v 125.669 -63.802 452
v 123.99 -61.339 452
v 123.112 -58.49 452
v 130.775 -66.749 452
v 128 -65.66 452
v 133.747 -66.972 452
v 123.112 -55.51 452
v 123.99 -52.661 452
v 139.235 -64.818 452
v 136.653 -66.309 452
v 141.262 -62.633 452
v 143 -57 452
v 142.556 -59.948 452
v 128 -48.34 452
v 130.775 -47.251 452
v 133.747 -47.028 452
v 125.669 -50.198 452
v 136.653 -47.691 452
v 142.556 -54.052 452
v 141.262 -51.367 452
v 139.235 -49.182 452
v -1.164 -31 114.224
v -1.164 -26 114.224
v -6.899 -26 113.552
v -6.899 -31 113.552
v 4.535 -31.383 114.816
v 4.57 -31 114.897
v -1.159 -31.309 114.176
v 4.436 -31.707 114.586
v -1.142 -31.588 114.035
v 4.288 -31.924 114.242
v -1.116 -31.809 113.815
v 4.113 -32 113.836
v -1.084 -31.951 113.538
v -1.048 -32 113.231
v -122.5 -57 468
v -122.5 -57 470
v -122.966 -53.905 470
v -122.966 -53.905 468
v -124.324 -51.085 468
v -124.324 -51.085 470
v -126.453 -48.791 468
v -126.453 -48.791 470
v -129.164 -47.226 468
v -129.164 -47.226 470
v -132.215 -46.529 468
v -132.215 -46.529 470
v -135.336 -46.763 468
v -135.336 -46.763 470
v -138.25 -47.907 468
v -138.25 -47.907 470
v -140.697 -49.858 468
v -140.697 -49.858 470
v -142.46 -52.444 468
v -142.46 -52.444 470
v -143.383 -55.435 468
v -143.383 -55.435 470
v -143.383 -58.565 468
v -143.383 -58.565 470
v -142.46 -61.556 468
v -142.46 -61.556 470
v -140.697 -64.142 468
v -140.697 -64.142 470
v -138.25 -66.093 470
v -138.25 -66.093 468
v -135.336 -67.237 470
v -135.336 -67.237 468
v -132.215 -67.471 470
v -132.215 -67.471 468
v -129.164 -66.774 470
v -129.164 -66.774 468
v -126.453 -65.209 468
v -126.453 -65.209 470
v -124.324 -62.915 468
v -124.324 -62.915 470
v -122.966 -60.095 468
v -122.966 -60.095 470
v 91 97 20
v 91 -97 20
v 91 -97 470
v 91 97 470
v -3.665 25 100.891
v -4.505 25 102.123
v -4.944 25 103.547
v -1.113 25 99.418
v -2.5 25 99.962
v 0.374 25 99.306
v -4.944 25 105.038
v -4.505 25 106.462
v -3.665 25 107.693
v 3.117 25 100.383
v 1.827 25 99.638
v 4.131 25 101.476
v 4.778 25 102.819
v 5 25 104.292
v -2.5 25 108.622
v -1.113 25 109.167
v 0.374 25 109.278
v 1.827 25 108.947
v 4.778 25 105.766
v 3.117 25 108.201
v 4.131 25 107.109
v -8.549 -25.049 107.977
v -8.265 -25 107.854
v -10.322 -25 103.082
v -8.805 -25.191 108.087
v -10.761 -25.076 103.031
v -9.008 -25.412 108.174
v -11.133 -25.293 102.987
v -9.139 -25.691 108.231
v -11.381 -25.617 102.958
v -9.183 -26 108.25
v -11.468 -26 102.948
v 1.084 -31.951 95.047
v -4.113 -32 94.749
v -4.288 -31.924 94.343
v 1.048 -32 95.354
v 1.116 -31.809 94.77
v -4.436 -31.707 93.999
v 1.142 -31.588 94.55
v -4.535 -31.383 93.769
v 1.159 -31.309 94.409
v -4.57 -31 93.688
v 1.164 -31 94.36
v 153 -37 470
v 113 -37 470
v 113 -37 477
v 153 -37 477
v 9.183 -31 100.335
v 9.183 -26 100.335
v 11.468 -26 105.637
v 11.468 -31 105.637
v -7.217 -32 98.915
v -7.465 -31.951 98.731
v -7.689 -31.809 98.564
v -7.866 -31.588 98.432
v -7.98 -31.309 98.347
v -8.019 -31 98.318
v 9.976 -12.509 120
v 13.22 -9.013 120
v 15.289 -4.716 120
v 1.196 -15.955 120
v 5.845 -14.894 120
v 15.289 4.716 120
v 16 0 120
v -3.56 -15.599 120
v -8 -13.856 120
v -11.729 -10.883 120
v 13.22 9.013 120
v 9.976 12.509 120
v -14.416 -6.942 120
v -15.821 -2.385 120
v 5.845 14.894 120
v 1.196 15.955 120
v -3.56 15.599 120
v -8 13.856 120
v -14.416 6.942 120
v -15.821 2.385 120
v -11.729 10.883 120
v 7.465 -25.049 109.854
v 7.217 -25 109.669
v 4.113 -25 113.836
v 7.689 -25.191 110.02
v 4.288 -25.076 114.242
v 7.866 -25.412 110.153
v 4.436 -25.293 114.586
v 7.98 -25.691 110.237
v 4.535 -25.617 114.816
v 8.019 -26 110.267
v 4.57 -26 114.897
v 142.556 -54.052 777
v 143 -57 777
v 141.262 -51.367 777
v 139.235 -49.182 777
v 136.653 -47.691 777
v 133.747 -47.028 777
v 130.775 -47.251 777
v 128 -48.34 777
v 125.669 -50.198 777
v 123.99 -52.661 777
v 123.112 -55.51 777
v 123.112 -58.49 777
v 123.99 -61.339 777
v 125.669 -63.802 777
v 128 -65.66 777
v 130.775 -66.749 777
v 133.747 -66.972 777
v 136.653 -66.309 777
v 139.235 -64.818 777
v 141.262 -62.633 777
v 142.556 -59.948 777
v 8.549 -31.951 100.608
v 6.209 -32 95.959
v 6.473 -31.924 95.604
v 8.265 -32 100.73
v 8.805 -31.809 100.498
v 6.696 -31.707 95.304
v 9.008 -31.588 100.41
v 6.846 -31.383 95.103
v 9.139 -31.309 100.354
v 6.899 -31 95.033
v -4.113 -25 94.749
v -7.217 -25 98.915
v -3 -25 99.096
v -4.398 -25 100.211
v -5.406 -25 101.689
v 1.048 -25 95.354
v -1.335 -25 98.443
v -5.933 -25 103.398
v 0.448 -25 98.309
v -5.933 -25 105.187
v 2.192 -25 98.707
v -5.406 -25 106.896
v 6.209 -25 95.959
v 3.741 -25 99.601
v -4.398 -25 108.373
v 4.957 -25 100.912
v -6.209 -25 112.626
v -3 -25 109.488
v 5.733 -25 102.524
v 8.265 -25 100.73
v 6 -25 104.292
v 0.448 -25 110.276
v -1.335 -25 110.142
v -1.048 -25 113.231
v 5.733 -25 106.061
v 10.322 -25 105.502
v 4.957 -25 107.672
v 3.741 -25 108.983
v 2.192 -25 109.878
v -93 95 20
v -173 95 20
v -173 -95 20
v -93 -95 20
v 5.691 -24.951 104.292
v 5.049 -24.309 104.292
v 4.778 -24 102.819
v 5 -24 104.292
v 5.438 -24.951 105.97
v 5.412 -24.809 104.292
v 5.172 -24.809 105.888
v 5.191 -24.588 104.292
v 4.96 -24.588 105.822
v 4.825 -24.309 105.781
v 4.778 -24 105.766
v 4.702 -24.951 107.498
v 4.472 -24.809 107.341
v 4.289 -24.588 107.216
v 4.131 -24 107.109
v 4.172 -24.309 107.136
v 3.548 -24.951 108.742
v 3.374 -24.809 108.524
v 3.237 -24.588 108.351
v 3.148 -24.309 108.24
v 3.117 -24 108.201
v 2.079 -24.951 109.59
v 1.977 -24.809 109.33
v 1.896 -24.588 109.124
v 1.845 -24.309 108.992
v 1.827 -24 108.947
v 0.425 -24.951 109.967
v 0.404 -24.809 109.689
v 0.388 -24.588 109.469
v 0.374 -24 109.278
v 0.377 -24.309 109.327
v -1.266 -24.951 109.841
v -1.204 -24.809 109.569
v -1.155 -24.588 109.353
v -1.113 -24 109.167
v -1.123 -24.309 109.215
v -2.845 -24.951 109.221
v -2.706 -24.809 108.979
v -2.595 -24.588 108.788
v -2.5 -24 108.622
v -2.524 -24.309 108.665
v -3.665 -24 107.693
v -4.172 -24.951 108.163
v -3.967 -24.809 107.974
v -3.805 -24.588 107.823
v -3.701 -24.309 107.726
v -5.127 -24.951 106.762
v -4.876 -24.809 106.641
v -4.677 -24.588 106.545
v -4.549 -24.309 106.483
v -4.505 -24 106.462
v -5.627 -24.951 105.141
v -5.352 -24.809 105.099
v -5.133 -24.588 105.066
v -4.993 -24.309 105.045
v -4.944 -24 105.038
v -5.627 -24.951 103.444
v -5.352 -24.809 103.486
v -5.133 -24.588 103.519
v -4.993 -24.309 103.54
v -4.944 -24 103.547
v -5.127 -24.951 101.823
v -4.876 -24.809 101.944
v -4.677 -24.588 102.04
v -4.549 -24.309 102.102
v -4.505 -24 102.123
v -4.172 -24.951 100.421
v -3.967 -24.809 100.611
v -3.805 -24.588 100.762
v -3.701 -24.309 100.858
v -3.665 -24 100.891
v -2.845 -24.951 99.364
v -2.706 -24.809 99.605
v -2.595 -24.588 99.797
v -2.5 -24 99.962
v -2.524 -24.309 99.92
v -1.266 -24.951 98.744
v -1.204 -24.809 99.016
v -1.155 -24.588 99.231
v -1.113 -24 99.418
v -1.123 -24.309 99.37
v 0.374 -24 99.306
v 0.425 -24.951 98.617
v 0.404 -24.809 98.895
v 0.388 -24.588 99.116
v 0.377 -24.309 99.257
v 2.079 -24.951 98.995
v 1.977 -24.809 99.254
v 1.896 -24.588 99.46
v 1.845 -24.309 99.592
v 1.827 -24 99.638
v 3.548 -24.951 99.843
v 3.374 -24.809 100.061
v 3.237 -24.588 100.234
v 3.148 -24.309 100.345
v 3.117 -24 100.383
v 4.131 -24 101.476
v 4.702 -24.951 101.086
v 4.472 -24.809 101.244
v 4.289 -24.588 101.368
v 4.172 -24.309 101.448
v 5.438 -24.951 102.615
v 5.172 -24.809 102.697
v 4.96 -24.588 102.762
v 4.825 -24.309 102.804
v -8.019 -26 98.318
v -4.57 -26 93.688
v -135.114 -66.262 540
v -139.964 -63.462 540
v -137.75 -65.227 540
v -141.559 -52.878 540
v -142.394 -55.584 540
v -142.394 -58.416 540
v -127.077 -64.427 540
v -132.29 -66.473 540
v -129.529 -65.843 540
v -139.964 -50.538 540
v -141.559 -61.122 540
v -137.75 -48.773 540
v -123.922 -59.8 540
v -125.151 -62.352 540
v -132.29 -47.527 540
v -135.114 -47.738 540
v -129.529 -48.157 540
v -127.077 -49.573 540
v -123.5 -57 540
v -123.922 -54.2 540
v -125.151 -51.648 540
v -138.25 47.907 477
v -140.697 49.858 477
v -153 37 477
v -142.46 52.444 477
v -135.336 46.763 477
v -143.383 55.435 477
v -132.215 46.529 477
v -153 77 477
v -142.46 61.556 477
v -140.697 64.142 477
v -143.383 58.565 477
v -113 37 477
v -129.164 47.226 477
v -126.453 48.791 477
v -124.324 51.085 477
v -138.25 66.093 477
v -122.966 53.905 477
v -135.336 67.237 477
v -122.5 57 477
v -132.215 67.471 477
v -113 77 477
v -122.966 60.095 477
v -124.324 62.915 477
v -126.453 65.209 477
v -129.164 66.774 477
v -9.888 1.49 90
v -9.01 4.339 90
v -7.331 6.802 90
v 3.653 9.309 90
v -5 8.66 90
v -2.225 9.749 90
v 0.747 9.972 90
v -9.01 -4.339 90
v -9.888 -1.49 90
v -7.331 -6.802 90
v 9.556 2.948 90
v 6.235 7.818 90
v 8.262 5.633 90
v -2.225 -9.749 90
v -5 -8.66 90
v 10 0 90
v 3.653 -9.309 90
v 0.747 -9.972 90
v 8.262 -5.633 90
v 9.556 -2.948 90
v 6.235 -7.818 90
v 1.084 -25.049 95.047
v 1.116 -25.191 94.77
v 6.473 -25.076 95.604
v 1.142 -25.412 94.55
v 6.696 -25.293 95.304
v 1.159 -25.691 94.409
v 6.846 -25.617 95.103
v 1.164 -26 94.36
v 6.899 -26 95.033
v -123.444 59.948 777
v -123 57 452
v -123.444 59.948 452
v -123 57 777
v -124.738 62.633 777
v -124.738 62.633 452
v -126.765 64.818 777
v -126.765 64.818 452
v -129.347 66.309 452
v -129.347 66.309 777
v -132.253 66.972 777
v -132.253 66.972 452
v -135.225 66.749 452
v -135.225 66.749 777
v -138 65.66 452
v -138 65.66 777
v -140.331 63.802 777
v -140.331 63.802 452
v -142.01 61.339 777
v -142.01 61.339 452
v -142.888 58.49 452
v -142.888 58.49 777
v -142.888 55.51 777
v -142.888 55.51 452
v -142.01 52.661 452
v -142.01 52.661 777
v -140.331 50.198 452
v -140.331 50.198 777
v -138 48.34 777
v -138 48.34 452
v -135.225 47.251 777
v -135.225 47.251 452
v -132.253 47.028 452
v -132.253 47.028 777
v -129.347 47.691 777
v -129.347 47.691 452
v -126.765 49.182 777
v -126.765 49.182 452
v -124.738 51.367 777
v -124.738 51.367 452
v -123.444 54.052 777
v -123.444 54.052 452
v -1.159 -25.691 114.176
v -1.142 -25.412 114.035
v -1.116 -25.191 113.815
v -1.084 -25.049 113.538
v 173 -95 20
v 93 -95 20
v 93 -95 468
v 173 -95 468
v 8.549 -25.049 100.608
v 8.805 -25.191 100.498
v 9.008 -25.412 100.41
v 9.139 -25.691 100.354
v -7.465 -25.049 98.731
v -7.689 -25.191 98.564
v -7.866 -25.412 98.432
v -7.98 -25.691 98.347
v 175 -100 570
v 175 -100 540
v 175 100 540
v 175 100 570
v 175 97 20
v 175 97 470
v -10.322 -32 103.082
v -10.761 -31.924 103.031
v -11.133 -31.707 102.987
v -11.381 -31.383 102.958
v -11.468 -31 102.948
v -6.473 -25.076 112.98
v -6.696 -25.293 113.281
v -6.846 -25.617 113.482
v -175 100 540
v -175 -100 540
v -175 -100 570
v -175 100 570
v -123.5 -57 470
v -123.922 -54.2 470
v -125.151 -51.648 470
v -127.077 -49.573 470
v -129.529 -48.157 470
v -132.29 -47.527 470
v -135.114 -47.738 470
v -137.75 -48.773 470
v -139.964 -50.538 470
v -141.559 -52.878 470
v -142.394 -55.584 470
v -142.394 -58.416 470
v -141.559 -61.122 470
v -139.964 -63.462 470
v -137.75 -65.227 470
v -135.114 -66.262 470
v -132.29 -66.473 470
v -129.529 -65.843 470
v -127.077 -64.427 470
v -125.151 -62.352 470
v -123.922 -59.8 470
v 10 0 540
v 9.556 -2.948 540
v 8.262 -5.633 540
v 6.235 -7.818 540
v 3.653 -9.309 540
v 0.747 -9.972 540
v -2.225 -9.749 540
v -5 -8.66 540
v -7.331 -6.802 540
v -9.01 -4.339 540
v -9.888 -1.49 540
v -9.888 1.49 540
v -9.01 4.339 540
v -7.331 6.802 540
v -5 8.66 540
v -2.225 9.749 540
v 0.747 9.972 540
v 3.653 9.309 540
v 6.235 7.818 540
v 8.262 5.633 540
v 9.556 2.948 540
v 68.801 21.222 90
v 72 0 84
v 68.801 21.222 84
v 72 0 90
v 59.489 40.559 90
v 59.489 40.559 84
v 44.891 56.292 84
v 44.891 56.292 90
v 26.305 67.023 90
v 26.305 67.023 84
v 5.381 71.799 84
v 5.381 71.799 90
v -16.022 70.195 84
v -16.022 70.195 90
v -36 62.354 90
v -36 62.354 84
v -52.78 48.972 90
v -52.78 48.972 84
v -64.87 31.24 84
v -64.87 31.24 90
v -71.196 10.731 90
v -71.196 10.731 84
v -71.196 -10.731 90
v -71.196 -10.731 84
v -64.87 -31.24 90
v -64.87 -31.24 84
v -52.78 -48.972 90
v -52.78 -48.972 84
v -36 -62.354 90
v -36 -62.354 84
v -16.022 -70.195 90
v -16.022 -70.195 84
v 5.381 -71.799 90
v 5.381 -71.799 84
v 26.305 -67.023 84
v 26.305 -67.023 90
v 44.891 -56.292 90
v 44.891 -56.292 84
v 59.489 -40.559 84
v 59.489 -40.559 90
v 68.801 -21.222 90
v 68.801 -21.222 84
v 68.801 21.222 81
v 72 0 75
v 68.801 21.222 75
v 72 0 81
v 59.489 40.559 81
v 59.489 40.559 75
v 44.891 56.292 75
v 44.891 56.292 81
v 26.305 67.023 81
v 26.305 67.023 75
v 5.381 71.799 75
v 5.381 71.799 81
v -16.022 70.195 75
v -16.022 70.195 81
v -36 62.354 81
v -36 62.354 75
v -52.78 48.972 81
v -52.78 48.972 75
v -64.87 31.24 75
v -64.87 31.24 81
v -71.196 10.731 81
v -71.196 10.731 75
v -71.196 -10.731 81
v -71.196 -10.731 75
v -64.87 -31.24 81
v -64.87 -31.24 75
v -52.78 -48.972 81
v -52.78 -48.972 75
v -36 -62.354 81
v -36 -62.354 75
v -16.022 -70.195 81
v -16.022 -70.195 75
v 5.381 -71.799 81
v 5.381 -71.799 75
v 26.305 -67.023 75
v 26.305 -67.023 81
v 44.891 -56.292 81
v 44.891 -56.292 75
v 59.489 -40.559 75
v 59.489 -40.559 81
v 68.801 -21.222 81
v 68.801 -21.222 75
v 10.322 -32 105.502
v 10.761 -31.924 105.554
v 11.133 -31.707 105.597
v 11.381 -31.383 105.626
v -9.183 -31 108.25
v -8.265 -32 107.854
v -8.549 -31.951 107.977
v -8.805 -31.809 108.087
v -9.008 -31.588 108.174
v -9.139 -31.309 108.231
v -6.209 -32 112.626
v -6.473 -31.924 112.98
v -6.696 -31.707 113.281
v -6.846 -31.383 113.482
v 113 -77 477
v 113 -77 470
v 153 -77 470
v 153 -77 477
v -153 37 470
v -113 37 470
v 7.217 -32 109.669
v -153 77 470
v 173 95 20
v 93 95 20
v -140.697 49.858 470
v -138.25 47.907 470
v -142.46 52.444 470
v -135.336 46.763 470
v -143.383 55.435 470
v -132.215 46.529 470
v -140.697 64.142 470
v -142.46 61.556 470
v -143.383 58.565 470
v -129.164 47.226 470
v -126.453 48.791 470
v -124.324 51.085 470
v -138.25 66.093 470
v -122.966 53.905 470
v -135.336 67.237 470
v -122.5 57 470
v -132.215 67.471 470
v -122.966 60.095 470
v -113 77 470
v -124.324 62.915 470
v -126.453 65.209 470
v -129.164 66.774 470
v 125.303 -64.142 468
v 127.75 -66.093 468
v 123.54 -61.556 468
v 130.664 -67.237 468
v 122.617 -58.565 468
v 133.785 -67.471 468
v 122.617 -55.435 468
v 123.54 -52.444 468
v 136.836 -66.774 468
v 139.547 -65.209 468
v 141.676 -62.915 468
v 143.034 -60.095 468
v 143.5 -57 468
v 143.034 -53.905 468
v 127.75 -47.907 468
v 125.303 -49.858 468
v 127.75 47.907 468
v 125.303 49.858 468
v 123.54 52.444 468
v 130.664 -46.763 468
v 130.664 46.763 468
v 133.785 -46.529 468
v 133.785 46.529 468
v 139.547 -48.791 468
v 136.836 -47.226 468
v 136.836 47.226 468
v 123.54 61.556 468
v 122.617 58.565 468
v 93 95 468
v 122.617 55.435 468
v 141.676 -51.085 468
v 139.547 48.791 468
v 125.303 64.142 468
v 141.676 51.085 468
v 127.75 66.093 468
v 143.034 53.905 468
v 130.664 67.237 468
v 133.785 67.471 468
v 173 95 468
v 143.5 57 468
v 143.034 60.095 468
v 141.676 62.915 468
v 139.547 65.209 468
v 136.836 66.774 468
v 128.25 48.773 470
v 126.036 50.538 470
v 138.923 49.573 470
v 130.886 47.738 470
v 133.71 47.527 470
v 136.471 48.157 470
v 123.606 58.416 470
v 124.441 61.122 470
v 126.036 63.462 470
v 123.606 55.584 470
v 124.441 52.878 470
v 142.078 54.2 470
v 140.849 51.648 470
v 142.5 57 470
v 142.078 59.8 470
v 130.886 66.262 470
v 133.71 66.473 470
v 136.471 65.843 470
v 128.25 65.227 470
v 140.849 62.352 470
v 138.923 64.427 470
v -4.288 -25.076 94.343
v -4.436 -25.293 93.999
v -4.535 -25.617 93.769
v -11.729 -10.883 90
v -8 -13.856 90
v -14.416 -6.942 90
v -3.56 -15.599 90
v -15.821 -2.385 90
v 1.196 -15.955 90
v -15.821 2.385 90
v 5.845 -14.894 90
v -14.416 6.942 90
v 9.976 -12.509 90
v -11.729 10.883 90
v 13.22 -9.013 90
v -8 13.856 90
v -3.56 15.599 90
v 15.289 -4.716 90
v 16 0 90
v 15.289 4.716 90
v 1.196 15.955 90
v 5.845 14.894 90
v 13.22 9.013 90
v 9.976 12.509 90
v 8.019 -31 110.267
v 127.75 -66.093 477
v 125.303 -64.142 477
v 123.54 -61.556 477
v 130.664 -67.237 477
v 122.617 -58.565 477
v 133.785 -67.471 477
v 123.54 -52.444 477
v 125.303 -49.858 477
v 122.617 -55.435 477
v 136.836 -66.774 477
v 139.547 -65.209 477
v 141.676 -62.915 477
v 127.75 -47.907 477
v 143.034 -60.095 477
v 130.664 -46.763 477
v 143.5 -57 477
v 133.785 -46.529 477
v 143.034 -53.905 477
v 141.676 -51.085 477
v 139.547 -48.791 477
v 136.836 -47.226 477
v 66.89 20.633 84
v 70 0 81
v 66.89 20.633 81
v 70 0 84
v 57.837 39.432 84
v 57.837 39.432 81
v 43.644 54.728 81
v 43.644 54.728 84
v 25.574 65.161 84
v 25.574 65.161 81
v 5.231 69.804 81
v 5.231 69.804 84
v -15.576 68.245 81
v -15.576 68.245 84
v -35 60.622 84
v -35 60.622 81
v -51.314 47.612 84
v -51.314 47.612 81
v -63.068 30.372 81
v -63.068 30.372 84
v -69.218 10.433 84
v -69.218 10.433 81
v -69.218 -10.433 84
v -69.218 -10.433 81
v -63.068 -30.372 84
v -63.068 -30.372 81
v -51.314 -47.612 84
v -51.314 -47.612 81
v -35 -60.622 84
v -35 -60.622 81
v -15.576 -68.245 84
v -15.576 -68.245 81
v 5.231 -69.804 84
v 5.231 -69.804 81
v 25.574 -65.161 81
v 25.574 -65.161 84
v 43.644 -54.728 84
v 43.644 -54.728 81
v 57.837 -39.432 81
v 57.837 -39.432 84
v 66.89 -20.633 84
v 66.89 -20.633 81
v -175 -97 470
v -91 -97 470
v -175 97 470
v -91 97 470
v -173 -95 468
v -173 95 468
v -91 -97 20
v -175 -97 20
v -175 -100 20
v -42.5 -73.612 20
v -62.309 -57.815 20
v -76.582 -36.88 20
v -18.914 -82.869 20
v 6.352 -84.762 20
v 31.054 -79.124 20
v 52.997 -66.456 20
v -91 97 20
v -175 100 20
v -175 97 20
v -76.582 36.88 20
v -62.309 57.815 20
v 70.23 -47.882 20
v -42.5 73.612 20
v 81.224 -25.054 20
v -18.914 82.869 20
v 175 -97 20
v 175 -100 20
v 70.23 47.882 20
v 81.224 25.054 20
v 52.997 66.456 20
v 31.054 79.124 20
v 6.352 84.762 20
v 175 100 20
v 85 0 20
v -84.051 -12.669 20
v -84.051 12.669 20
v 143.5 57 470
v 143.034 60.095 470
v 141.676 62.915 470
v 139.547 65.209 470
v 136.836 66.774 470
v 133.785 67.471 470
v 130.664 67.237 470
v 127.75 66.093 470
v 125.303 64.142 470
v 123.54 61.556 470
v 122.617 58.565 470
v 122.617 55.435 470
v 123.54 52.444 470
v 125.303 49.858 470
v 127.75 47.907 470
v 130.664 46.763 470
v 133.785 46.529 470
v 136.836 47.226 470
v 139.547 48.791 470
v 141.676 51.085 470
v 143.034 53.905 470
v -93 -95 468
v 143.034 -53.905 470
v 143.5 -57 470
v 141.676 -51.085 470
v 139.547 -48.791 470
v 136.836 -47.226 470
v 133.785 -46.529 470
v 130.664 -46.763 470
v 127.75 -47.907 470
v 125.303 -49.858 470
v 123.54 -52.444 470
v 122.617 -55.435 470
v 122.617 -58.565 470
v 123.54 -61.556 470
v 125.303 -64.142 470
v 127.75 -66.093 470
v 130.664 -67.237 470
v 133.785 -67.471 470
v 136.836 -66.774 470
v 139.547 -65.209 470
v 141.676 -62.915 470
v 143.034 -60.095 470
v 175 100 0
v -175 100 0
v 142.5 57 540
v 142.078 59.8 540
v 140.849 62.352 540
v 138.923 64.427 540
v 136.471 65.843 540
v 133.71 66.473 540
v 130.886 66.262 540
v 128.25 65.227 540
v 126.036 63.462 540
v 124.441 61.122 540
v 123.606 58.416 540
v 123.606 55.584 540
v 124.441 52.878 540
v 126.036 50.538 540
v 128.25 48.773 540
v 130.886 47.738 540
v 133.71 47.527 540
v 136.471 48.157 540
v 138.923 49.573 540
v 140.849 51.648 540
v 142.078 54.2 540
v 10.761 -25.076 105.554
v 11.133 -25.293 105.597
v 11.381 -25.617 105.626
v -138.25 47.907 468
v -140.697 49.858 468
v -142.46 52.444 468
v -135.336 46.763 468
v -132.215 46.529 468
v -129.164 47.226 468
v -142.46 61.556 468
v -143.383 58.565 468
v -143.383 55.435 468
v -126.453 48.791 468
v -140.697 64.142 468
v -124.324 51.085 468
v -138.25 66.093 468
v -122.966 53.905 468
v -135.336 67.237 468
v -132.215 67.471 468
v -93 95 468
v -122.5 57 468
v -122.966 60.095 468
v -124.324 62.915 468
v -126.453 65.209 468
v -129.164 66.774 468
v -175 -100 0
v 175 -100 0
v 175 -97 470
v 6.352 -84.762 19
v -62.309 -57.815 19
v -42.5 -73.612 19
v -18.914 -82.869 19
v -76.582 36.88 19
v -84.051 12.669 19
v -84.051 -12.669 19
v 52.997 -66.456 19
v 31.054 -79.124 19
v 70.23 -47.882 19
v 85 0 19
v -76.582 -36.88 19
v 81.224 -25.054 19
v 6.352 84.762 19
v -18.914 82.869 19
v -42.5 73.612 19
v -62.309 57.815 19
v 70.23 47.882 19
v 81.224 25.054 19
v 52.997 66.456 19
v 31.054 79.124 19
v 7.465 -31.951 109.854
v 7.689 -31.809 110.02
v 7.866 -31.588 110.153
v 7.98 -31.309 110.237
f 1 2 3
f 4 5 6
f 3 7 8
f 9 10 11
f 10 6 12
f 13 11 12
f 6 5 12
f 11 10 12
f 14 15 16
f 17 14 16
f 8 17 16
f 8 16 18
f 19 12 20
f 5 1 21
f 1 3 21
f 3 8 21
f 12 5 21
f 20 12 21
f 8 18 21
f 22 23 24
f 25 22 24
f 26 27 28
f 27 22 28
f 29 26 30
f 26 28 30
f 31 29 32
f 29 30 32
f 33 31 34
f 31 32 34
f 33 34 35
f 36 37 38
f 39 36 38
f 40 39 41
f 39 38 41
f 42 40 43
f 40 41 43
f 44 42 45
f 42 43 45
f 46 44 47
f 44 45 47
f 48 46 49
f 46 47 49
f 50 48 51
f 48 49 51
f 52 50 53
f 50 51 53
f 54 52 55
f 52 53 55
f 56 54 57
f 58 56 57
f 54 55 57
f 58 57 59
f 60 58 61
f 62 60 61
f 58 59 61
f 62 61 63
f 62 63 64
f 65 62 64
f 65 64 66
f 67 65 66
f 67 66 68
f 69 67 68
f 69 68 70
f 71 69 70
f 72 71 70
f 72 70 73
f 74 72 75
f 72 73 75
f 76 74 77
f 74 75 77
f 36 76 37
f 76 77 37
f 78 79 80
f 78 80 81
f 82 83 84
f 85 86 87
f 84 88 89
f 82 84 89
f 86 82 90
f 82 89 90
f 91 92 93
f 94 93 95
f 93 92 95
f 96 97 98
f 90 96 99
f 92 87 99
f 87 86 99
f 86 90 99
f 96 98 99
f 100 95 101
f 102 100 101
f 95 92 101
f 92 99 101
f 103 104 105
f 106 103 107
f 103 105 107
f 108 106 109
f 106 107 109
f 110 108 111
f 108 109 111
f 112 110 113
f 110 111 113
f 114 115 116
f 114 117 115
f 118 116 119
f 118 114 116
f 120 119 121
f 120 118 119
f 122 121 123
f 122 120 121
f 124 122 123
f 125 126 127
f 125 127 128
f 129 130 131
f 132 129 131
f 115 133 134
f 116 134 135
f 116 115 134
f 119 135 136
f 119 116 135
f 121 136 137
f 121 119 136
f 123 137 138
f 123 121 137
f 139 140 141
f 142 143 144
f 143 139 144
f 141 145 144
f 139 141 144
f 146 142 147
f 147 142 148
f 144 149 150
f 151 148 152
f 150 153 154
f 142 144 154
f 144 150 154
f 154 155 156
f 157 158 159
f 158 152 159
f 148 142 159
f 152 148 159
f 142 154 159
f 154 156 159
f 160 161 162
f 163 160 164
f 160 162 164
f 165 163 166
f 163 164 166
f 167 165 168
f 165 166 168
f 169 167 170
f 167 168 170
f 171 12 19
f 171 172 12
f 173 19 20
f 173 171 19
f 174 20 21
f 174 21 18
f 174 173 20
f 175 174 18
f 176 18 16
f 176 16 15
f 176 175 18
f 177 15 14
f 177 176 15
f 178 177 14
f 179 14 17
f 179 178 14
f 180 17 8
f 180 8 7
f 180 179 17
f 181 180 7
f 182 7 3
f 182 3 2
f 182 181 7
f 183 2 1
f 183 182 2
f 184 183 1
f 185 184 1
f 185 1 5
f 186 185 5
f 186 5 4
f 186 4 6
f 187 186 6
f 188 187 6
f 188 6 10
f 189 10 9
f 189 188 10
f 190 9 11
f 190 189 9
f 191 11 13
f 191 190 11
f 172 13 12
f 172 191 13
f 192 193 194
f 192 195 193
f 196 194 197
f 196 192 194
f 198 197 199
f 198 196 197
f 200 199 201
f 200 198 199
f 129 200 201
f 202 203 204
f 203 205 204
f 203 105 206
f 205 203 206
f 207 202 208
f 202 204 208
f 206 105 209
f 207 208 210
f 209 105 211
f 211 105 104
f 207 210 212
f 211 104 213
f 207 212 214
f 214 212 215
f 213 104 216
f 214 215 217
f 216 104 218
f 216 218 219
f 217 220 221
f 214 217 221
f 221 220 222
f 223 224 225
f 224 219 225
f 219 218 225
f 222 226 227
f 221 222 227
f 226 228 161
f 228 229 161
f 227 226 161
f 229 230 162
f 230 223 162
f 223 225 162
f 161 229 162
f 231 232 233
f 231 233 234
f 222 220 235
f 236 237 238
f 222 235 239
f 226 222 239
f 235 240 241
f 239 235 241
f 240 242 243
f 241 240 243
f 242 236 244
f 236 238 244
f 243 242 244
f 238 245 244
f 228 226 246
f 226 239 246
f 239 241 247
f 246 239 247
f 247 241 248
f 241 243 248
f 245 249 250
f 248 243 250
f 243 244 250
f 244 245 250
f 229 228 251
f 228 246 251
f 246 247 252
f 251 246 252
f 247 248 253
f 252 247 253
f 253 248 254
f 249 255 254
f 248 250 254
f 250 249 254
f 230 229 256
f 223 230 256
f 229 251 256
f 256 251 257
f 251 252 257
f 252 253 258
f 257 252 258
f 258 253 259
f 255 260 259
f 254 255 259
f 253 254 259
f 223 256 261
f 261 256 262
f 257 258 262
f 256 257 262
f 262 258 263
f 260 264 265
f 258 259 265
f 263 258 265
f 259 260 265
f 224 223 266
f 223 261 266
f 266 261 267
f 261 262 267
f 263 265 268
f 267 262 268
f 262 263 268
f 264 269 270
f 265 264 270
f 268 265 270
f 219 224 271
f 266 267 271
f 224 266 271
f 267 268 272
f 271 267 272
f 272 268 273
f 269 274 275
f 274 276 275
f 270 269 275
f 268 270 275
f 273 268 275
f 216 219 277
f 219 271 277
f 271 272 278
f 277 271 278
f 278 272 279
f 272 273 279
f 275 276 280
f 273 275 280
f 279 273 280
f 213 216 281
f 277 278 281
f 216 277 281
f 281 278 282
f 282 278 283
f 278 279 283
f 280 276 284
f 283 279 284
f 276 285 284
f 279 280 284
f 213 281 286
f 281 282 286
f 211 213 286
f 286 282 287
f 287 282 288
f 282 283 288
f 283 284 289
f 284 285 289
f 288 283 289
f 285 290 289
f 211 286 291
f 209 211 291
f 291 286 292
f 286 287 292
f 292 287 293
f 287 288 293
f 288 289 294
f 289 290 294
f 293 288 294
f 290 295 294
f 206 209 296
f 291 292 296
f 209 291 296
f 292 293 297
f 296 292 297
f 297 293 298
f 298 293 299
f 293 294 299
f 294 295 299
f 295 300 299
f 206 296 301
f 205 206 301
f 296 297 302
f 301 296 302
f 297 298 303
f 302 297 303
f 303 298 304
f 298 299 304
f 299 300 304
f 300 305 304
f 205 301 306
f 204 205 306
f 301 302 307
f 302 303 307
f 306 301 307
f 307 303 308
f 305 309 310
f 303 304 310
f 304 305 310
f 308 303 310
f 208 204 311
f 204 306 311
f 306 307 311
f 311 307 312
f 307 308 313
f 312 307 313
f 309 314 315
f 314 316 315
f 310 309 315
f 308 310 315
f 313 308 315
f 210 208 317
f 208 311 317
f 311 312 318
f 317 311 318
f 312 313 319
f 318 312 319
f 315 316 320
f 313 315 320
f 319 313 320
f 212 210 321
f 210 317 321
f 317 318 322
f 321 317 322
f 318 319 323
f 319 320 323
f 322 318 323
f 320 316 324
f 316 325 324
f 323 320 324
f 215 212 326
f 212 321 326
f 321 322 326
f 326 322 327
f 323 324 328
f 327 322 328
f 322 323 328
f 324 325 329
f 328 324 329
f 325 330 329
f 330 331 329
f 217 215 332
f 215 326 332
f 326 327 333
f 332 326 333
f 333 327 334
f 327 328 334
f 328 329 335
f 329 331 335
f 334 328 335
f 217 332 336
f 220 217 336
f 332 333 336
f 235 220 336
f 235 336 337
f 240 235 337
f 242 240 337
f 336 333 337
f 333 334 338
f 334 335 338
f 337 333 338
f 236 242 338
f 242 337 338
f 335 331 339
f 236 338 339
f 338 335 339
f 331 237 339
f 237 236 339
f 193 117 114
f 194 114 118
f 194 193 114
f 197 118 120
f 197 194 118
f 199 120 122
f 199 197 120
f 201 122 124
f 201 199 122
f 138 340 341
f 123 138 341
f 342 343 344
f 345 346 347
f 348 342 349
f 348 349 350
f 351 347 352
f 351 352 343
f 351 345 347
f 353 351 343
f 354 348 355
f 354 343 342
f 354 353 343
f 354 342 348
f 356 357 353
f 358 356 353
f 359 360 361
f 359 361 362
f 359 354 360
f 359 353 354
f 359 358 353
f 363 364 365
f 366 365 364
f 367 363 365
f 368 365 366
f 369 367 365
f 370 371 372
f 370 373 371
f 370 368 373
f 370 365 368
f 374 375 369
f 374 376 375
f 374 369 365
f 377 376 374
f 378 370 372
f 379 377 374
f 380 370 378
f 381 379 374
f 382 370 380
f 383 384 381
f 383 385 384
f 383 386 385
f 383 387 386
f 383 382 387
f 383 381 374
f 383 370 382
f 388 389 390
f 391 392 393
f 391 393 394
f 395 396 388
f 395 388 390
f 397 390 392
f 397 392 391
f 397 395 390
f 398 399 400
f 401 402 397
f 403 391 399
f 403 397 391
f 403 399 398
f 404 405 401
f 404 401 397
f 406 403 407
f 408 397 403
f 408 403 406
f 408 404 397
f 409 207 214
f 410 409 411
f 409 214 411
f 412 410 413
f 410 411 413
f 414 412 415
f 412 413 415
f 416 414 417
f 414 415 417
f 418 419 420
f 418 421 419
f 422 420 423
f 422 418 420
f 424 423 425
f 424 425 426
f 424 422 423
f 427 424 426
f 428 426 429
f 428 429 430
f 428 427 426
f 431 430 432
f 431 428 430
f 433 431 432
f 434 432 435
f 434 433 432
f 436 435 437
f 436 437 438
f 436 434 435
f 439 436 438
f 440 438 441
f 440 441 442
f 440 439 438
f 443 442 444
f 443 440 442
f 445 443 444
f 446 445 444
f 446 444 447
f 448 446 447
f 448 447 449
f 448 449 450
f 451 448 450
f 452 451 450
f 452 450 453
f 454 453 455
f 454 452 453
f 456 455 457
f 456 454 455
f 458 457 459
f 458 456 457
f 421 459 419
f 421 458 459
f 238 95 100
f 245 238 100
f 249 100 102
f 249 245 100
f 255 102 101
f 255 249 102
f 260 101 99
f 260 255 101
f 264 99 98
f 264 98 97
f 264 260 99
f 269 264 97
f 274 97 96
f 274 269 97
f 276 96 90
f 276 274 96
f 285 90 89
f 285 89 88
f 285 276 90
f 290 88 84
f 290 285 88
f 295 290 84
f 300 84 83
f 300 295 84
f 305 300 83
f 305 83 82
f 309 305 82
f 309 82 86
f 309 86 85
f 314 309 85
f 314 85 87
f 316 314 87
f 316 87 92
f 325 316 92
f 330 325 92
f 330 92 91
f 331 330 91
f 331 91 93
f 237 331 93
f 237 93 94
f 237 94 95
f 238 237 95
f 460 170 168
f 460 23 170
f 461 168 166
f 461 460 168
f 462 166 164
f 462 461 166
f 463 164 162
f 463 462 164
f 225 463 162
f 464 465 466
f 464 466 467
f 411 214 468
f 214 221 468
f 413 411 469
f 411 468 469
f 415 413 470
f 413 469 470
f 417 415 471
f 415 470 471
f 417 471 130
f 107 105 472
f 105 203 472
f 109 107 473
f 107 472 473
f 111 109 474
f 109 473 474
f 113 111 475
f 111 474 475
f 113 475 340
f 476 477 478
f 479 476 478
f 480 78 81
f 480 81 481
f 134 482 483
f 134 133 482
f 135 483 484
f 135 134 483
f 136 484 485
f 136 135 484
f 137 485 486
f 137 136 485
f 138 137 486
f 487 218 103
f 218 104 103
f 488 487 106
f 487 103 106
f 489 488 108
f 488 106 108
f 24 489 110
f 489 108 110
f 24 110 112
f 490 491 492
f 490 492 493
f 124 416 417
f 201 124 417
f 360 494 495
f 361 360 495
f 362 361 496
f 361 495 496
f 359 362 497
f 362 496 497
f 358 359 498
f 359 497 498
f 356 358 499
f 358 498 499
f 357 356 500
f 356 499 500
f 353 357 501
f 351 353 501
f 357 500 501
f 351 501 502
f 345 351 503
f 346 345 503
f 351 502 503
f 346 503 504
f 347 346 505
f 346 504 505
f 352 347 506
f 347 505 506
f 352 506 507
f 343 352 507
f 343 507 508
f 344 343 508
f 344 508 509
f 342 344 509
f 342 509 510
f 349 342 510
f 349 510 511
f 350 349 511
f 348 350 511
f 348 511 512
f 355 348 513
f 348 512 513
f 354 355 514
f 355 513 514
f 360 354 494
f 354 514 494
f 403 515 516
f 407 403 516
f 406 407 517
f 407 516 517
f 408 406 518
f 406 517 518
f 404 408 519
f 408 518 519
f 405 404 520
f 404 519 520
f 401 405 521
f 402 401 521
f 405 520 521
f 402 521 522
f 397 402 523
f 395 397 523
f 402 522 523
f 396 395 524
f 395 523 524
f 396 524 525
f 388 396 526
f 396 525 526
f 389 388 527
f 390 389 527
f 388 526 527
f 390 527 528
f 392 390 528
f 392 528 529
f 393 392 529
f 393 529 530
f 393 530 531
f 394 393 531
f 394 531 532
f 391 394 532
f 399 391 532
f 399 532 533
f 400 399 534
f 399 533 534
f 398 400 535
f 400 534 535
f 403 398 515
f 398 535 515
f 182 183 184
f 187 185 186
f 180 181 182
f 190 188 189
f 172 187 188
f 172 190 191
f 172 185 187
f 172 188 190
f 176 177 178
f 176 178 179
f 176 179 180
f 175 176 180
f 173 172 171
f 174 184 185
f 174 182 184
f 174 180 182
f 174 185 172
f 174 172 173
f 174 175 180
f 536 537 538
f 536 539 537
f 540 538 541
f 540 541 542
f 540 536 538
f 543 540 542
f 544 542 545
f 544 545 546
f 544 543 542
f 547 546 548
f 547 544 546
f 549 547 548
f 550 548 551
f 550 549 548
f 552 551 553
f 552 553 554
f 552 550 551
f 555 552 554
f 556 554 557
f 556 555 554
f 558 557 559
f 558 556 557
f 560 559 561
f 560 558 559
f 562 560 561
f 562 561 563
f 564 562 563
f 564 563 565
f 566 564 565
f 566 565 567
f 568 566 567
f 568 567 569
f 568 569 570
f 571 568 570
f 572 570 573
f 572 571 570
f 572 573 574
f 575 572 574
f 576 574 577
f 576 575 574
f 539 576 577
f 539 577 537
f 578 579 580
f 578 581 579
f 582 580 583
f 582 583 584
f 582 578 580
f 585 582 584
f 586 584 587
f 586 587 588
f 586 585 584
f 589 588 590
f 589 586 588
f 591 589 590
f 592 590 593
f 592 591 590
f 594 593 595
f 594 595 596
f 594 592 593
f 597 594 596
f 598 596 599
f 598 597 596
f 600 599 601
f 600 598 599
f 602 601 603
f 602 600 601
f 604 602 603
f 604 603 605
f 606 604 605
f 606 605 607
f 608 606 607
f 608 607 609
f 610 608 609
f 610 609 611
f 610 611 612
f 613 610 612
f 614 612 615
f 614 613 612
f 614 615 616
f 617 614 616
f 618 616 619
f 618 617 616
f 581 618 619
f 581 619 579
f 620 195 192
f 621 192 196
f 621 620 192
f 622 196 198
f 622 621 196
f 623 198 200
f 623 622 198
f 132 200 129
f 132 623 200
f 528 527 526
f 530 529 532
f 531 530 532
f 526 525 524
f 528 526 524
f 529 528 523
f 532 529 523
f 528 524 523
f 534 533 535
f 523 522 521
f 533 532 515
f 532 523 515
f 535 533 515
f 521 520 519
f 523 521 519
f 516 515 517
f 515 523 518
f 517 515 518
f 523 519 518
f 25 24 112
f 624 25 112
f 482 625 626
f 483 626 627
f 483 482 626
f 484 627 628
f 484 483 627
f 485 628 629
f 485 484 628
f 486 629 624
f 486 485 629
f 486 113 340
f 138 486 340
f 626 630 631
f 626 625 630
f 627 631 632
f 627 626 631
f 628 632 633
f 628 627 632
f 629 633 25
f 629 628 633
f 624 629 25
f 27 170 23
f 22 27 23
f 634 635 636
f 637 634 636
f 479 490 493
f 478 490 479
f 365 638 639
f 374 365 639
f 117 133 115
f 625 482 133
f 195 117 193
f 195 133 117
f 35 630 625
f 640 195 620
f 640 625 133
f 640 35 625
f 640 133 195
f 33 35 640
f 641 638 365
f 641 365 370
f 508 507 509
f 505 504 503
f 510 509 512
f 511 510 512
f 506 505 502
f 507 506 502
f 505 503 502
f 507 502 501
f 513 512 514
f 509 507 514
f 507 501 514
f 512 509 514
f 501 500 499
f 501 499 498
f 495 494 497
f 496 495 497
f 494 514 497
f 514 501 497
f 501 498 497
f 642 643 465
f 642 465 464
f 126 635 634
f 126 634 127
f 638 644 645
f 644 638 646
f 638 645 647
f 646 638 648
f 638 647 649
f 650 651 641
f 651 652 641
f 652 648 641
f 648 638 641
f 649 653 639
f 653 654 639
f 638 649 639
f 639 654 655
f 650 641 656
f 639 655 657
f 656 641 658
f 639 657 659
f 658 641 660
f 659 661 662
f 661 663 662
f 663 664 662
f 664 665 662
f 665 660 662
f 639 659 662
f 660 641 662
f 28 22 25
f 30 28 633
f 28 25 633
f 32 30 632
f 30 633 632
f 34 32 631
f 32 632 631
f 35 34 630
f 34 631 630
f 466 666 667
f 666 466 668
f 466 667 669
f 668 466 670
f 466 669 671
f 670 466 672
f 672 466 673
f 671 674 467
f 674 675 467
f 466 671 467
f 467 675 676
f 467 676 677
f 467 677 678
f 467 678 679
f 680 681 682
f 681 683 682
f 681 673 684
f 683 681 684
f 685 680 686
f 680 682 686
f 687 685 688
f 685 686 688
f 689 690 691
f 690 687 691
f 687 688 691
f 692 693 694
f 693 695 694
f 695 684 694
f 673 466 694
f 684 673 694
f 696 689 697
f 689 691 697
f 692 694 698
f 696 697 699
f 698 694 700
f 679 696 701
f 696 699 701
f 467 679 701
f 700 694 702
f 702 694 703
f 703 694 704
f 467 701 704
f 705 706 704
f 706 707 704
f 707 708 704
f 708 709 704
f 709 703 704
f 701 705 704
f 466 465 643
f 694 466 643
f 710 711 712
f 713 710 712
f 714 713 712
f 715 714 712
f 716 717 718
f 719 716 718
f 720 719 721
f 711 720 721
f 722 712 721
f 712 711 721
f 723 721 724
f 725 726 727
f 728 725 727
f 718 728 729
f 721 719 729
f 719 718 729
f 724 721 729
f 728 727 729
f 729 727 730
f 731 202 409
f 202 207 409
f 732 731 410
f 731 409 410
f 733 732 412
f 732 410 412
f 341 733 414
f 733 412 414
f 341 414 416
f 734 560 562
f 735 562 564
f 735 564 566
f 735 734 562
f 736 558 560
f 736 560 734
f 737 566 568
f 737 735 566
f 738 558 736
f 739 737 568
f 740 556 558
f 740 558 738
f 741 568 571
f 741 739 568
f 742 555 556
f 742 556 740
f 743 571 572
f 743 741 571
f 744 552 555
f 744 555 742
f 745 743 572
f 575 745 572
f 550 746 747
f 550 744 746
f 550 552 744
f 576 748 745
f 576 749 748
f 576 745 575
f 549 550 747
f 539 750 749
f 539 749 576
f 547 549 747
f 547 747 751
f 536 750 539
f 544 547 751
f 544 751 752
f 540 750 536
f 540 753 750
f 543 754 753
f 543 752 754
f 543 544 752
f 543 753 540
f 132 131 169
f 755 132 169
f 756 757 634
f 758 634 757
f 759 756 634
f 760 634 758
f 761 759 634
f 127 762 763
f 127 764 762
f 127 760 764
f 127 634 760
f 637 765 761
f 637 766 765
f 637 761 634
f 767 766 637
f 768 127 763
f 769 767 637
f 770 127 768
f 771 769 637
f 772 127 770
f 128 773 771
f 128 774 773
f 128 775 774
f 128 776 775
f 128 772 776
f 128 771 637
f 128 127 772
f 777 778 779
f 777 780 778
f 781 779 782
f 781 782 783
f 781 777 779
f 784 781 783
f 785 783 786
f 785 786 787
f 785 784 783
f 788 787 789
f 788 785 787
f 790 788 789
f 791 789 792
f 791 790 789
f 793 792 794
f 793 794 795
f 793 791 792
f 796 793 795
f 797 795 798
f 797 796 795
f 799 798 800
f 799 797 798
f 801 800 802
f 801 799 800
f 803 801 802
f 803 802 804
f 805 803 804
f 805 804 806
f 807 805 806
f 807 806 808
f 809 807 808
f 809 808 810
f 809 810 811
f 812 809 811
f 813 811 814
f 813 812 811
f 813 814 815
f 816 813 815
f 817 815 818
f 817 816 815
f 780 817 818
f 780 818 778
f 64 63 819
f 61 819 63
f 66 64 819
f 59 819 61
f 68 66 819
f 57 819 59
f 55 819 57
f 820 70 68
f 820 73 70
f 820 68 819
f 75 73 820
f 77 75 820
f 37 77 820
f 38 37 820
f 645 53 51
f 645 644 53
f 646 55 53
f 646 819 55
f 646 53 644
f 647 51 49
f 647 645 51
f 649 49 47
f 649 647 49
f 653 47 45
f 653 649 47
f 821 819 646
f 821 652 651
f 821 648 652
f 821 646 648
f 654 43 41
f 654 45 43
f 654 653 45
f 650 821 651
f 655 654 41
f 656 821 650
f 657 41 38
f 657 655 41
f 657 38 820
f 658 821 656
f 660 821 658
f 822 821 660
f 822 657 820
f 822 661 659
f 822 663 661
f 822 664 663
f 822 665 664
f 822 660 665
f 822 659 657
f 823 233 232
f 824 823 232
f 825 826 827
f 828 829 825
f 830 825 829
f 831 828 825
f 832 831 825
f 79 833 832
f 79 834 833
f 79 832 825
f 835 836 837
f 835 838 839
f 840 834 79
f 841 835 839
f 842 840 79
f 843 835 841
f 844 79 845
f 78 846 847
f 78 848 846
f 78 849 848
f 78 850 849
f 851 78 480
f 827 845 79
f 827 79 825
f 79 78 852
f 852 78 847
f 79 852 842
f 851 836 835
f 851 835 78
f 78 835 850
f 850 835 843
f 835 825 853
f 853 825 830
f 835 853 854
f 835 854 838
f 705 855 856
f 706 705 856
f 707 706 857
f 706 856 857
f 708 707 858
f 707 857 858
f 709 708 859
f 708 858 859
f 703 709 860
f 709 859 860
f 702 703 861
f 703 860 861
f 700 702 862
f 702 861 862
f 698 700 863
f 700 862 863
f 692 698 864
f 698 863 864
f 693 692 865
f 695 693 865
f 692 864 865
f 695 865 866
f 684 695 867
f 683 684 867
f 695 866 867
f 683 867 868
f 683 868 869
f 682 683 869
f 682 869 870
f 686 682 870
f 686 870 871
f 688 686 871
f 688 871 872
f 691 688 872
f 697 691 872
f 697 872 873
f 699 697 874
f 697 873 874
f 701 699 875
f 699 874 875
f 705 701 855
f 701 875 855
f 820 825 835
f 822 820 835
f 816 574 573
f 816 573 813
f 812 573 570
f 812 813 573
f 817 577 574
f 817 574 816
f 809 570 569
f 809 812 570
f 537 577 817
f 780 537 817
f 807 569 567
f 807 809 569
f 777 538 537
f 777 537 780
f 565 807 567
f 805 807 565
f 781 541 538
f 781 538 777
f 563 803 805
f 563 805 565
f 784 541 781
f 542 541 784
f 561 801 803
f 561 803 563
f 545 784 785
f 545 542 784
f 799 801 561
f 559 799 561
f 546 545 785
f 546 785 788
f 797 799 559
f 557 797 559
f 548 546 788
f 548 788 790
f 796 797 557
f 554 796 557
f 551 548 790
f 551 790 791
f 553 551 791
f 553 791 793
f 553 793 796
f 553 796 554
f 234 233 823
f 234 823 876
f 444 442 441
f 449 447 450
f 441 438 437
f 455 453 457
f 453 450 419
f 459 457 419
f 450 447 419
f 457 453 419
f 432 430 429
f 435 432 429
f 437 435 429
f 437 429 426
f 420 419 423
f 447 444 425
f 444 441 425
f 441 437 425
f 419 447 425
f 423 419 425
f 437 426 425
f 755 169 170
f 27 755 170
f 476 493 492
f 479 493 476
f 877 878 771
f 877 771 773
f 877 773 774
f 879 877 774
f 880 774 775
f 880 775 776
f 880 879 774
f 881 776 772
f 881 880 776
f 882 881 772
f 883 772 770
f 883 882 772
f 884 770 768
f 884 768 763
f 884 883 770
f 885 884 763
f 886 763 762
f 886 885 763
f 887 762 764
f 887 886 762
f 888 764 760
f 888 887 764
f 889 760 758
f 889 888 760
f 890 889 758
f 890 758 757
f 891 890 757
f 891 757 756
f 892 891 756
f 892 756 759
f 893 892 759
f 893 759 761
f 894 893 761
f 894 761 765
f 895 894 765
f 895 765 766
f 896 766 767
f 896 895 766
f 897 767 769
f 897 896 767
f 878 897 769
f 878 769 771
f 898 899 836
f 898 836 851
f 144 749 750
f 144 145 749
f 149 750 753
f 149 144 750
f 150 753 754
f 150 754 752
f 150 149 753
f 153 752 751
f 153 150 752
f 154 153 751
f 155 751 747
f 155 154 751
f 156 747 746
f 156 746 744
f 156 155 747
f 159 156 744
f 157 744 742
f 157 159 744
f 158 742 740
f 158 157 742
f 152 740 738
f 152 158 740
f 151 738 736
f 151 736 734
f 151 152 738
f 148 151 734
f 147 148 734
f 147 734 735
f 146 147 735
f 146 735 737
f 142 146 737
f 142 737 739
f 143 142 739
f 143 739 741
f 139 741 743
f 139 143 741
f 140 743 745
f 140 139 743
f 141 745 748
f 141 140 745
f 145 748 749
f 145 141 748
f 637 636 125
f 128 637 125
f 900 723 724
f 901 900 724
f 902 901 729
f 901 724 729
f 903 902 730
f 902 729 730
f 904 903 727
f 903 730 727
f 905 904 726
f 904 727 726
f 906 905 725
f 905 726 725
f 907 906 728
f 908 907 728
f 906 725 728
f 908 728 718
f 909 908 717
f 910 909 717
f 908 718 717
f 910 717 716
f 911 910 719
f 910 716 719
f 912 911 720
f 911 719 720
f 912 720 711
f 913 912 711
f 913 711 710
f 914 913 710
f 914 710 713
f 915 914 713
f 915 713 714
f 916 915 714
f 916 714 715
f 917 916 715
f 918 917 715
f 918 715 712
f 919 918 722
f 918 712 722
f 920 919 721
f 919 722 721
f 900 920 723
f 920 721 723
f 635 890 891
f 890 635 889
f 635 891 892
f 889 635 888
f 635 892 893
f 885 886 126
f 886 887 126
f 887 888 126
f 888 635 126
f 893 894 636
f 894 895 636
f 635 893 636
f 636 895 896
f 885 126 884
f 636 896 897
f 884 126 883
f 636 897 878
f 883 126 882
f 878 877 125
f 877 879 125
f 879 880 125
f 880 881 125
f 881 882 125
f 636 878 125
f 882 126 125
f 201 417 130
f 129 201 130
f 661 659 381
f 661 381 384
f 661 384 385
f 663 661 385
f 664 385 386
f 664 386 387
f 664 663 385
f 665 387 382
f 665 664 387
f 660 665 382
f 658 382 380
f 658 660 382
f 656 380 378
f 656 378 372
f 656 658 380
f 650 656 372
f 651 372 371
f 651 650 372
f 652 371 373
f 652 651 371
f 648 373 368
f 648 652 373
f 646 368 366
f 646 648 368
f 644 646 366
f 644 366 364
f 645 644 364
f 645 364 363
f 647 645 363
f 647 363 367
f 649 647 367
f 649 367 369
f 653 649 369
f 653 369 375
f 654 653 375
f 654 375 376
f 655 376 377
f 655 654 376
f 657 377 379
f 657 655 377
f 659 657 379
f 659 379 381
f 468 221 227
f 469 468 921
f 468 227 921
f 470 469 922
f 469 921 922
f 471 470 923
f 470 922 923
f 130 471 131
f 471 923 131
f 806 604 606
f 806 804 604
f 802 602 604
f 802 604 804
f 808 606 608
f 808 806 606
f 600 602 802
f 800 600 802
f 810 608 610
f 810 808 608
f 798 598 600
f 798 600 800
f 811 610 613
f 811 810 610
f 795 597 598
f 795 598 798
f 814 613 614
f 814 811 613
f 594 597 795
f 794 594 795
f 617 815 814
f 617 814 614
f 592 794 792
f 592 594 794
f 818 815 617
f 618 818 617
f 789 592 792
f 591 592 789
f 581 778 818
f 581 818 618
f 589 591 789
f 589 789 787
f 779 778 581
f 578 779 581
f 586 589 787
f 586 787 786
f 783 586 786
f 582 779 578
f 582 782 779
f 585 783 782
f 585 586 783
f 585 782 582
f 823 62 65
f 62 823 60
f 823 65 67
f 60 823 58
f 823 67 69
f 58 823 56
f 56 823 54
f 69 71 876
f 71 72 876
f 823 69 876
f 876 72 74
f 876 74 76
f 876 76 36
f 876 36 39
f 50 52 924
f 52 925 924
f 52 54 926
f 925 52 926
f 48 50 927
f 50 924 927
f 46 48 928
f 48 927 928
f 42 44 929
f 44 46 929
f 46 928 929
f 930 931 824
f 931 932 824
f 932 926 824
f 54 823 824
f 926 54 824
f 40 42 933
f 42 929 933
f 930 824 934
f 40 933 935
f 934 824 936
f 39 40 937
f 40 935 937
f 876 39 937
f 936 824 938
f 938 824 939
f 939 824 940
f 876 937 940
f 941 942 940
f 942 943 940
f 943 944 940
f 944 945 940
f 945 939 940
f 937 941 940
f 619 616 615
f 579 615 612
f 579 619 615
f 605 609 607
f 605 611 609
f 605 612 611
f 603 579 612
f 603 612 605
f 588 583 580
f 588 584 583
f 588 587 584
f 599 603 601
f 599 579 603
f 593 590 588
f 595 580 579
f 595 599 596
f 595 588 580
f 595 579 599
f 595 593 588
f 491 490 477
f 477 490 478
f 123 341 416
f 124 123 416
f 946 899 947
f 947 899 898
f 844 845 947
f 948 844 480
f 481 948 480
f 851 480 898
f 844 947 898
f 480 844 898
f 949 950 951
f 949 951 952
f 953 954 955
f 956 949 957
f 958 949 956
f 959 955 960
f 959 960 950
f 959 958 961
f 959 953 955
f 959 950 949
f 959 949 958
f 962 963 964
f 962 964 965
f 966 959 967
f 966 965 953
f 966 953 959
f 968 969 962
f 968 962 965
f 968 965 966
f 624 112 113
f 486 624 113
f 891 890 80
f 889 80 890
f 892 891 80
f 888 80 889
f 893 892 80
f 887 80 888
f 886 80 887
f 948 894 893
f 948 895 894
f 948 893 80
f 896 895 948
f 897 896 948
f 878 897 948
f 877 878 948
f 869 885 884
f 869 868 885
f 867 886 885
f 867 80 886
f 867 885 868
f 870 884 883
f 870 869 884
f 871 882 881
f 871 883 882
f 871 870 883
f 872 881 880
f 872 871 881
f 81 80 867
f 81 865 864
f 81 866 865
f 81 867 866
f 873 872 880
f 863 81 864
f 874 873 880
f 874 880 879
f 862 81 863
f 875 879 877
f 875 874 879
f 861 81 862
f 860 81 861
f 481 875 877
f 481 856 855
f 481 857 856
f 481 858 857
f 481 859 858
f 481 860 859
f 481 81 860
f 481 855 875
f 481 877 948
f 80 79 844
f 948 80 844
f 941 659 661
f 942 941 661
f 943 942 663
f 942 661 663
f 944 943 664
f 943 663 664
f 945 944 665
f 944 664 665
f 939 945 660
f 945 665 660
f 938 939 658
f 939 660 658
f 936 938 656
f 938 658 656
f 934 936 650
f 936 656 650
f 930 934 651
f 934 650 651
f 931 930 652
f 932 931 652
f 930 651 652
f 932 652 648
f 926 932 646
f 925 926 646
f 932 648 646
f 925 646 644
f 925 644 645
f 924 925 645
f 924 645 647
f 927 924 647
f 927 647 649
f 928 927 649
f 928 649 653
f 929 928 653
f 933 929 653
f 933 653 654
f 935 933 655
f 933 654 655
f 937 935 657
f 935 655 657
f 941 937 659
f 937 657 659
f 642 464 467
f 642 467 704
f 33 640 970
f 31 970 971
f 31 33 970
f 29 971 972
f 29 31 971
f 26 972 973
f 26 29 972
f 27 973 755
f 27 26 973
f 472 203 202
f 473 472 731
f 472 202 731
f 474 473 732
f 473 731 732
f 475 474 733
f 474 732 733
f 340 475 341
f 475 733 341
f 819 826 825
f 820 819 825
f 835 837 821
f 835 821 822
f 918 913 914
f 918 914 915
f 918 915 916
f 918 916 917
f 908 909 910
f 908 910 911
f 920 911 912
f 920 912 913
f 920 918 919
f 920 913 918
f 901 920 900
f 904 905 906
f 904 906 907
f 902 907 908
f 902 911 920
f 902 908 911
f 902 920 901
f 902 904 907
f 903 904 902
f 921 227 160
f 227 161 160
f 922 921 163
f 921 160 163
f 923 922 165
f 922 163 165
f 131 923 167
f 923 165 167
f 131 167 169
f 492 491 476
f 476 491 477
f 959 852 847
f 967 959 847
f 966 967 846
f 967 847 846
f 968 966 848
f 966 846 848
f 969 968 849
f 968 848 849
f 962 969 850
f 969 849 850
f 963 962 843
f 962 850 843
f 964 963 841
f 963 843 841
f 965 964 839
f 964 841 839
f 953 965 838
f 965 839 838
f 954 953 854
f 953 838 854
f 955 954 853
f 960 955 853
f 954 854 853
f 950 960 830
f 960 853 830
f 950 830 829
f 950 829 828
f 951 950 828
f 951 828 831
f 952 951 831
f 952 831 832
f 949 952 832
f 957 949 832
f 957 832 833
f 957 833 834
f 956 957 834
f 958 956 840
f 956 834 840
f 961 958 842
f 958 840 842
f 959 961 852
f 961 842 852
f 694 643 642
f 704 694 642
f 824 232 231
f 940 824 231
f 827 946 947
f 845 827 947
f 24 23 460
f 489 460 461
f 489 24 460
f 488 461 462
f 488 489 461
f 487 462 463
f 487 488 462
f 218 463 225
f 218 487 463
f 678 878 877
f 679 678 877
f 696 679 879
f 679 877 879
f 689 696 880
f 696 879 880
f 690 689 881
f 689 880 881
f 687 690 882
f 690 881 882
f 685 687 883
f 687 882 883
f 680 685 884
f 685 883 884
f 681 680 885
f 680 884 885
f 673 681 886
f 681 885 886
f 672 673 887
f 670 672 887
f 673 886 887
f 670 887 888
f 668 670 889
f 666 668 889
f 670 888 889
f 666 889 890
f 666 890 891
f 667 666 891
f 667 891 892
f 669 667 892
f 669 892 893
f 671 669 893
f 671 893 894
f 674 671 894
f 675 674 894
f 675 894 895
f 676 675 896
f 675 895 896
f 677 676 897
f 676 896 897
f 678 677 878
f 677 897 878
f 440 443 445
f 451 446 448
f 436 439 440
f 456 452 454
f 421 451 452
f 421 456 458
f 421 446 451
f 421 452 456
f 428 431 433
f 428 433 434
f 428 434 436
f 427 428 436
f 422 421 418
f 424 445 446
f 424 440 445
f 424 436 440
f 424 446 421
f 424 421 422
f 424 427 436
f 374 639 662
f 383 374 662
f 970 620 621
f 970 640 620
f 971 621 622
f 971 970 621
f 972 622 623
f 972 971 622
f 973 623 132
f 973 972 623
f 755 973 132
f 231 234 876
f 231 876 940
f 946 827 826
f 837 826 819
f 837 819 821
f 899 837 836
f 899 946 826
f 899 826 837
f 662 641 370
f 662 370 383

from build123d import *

# Parameters (mm, degrees)
F0_W           = 350
F0_H           = 200
F1_DEPTH       = 20
F2_W           = 84
F2_H           = 194
F2_W_2         = 80
F2_H_2         = 190
F3_DEPTH       = 450
F4_W           = 80
F4_H           = 190
F4_R           = 10.5
F4_W_2         = 84
F4_H_2         = 194
F5_DEPTH       = 2
F6_R           = 9.5
F7_DEPTH       = 70
F8_W           = 350
F8_H           = 200
F8_R           = 9.5
F9_DEPTH       = 30
F10_R          = 85
F11_DEPTH      = 1
F12_R          = 10
F13_DEPTH      = 450
F14_W          = 16
F14_H          = 30
F16_R          = 5
F17_DEPTH      = 25
F17_DEPTH_BACK = 25
F18_R          = 5
F19_DEPTH      = 7
F20_R          = 1
F21_W          = 40
F21_H          = 40
F21_R          = 10.5
F22_DEPTH      = 7
F23_R          = 10
F24_DEPTH      = 300
F24_DEPTH_BACK = 25


with BuildPart() as f1:
    # F0 (on Top) → F1 (new body)
    with BuildSketch(Plane.XY):
        Rectangle(F0_W, F0_H)
    extrude(amount=F1_DEPTH)

    # F2 (on face) → F3 (join)
    with BuildSketch(Plane.XY.offset(20)):
        with Locations((-133, 0)):
            Rectangle(F2_W, F2_H)
        with Locations((-133, 0)):
            Rectangle(F2_W_2, F2_H_2, mode=Mode.SUBTRACT)
        with Locations((133, 0)):
            Rectangle(F2_W, F2_H)
        with Locations((133, 0)):
            Rectangle(F2_W_2, F2_H_2, mode=Mode.SUBTRACT)
    extrude(amount=F3_DEPTH)

    # F4 (on face) → F5 (join)
    with BuildSketch(Plane.XY.offset(470)):
        with Locations((-133, 0)):
            Rectangle(F4_W, F4_H)
        with Locations((-133, -57)):
            Circle(F4_R, mode=Mode.SUBTRACT)
        with Locations((-133, 57)):
            Circle(F4_R, mode=Mode.SUBTRACT)
        with Locations((133, 0)):
            Rectangle(F4_W_2, F4_H_2)
        with Locations((133, -57)):
            Circle(F4_R, mode=Mode.SUBTRACT)
        with Locations((133, 57)):
            Circle(F4_R, mode=Mode.SUBTRACT)
    extrude(amount=-F5_DEPTH)

    # F10 (on face) → F11 (cut)
    with BuildSketch(Plane.XY.offset(20)):
        Circle(F10_R)
    extrude(amount=-F11_DEPTH, mode=Mode.SUBTRACT)


with BuildPart() as f7:
    # F6 (on face) → F7 (new body)
    with BuildSketch(Plane.XY.offset(470)):
        with Locations((-133, -57)):
            Circle(F6_R)
    extrude(amount=F7_DEPTH)


with BuildPart() as f7b:
    # F6 (on face) → F7, piece 2 (new body)
    with BuildSketch(Plane.XY.offset(470)):
        with Locations((133, 57)):
            Circle(F6_R)
    extrude(amount=F7_DEPTH)


with BuildPart() as f9:
    # F8 (on face) → F9 (new body)
    with BuildSketch(Plane.XY.offset(540)):
        Rectangle(F8_W, F8_H)
        with Locations((133, 57)):
            Circle(F8_R, mode=Mode.SUBTRACT)
        with Locations((133, 57)):
            Circle(F8_R)
    extrude(amount=F9_DEPTH)


with BuildPart() as f13:
    # F12 (on face) → F13 (new body)
    with BuildSketch(Plane(origin=(0, 0, 540), x_dir=(1, 0, 0), z_dir=(0, 0, -1))):
        Circle(F12_R)
    extrude(amount=F13_DEPTH)


with BuildPart() as f15:
    # F14 (on Front) → F15 (revolve)
    with BuildSketch(Plane.XZ):
        Polygon((16, 90), (0, 90), (0, 75), (72, 75), (72, 81), (70, 81), (70, 84), (72, 84), (72, 90), align=None)
        with Locations((8, 105)):
            Rectangle(F14_W, F14_H)
    revolve(axis=Axis((0, 0, 82.5), (0, 0, 1)))


with BuildPart() as f17:
    # F16 (on Front) → F17 (new body, two sides)
    with BuildSketch(Plane.XZ) as f17_sk:
        with Locations((0, 104.2923107743)):
            Circle(F16_R)
    extrude(amount=F17_DEPTH)
    extrude(f17_sk.sketch, amount=-F17_DEPTH_BACK)

    # F18 (on face) → F19 (join)
    with BuildSketch(Plane.XZ.offset(25)):
        with BuildLine():
            ThreePointArc((9.1834995564, 100.3346175196), (9.7937478925, 102.2717904903), (10, 104.2923107743))
            ThreePointArc((10, 104.2923107743), (9.491894557, 107.4393630013), (8.0192124561, 110.2666083551))
            ThreePointArc((8.0192124561, 110.2666083551), (3.9576923265, 113.4758107307), (-1.1642885194, 114.2243011209))
            ThreePointArc((-1.1642885194, 114.2243011209), (-5.974297981, 112.3115229323), (-9.1834995906, 108.2500039496))
            ThreePointArc((-9.1834995906, 108.2500039496), (-9.9319904991, 103.1280235561), (-8.0192123209, 98.3180130121))
            ThreePointArc((-8.0192123209, 98.3180130121), (-3.9576924307, 95.1088108628), (1.1642880694, 94.360320375))
            ThreePointArc((1.1642880694, 94.360320375), (5.9742977646, 96.2730984552), (9.1834995564, 100.3346175196))
        make_face()
        with Locations((0, 104.2923107743)):
            Circle(F18_R, mode=Mode.SUBTRACT)
        with Locations((0, 104.2923107743)):
            Circle(F18_R)
        with BuildLine():
            ThreePointArc((-9.1834995906, 108.2500039496), (-5.974297981, 112.3115229323), (-1.1642885194, 114.2243011209))
            Line((-1.1642885194, 114.2243011209), (-6.8985246466, 113.5520997046))
            Line((-6.8985246466, 113.5520997046), (-9.1834995906, 108.2500039496))
        make_face()
        with BuildLine():
            ThreePointArc((-8.0192123209, 98.3180130121), (-9.9319904991, 103.1280235561), (-9.1834995906, 108.2500039496))
            Line((-9.1834995906, 108.2500039496), (-11.4684747706, 102.9479076469))
            Line((-11.4684747706, 102.9479076469), (-8.0192123209, 98.3180130121))
        make_face()
        with BuildLine():
            Line((-4.569950124, 93.6881187166), (1.1642880694, 94.360320375))
            ThreePointArc((1.1642880694, 94.360320375), (-3.9576924307, 95.1088108628), (-8.0192123209, 98.3180130121))
            Line((-8.0192123209, 98.3180130121), (-4.569950124, 93.6881187166))
        make_face()
        with BuildLine():
            Line((6.8985246466, 95.032521844), (9.1834995564, 100.3346175196))
            ThreePointArc((9.1834995564, 100.3346175196), (5.9742977646, 96.2730984552), (1.1642880694, 94.360320375))
            Line((1.1642880694, 94.360320375), (6.8985246466, 95.032521844))
        make_face()
        with BuildLine():
            ThreePointArc((8.0192124561, 110.2666083551), (9.491894557, 107.4393630013), (10, 104.2923107743))
            ThreePointArc((10, 104.2923107743), (9.7937478925, 102.2717904903), (9.1834995564, 100.3346175196))
            Line((9.1834995564, 100.3346175196), (11.4684747706, 105.6367139017))
            Line((11.4684747706, 105.6367139017), (8.0192124561, 110.2666083551))
        make_face()
        with BuildLine():
            ThreePointArc((-1.1642885194, 114.2243011209), (3.9576923265, 113.4758107307), (8.0192124561, 110.2666083551))
            Line((8.0192124561, 110.2666083551), (4.569950124, 114.896502832))
            Line((4.569950124, 114.896502832), (-1.1642885194, 114.2243011209))
        make_face()
    extrude(amount=F19_DEPTH)

    # F20
    f20_edges = [f17.edges().sort_by_distance(p)[0] for p in [
        (-9.1835, -32, 108.250004),
        (-8.019212, -32, 98.318013),
        (1.164287, -32, 94.36032),
        (9.1835, -32, 100.334618),
        (8.019212, -32, 110.266608),
        (-1.164287, -32, 114.224301),
        (-9.1835, -25, 108.250004),
        (-1.164287, -25, 114.224301),
        (-8.019212, -25, 98.318013),
        (8.019212, -25, 110.266608),
        (1.164287, -25, 94.36032),
        (9.1835, -25, 100.334618),
        (-5, -25, 104.292311),
    ]]
    fillet(f20_edges, radius=F20_R)


with BuildPart() as f22:
    # F21 (on face) → F22 (new body)
    with BuildSketch(Plane.XY.offset(470)):
        with Locations((-133, 57)):
            Rectangle(F21_W, F21_H)
        with Locations((-133, 57)):
            Circle(F21_R, mode=Mode.SUBTRACT)
    extrude(amount=F22_DEPTH)


with BuildPart() as f22b:
    # F21 (on face) → F22, piece 2 (new body)
    with BuildSketch(Plane.XY.offset(470)):
        with Locations((133, -57)):
            Rectangle(F21_W, F21_H)
        with Locations((133, -57)):
            Circle(F21_R, mode=Mode.SUBTRACT)
    extrude(amount=F22_DEPTH)


with BuildPart() as f24:
    # F23 (on face) → F24 (new body, two sides)
    with BuildSketch(Plane.XY.offset(477)) as f24_sk:
        with Locations((-133, 57)):
            Circle(F23_R)
    extrude(amount=F24_DEPTH)
    extrude(f24_sk.sketch, amount=-F24_DEPTH_BACK)


with BuildPart() as f24b:
    # F23 (on face) → F24, piece 2 (new body, two sides)
    with BuildSketch(Plane.XY.offset(477)) as f24_2_sk:
        with Locations((133, -57)):
            Circle(F23_R)
    extrude(amount=F24_DEPTH)
    extrude(f24_2_sk.sketch, amount=-F24_DEPTH_BACK)


solid = Compound([f1.part, f7.part, f7b.part, f9.part, f13.part, f15.part, f17.part, f22.part, f22b.part, f24.part, f24b.part])
